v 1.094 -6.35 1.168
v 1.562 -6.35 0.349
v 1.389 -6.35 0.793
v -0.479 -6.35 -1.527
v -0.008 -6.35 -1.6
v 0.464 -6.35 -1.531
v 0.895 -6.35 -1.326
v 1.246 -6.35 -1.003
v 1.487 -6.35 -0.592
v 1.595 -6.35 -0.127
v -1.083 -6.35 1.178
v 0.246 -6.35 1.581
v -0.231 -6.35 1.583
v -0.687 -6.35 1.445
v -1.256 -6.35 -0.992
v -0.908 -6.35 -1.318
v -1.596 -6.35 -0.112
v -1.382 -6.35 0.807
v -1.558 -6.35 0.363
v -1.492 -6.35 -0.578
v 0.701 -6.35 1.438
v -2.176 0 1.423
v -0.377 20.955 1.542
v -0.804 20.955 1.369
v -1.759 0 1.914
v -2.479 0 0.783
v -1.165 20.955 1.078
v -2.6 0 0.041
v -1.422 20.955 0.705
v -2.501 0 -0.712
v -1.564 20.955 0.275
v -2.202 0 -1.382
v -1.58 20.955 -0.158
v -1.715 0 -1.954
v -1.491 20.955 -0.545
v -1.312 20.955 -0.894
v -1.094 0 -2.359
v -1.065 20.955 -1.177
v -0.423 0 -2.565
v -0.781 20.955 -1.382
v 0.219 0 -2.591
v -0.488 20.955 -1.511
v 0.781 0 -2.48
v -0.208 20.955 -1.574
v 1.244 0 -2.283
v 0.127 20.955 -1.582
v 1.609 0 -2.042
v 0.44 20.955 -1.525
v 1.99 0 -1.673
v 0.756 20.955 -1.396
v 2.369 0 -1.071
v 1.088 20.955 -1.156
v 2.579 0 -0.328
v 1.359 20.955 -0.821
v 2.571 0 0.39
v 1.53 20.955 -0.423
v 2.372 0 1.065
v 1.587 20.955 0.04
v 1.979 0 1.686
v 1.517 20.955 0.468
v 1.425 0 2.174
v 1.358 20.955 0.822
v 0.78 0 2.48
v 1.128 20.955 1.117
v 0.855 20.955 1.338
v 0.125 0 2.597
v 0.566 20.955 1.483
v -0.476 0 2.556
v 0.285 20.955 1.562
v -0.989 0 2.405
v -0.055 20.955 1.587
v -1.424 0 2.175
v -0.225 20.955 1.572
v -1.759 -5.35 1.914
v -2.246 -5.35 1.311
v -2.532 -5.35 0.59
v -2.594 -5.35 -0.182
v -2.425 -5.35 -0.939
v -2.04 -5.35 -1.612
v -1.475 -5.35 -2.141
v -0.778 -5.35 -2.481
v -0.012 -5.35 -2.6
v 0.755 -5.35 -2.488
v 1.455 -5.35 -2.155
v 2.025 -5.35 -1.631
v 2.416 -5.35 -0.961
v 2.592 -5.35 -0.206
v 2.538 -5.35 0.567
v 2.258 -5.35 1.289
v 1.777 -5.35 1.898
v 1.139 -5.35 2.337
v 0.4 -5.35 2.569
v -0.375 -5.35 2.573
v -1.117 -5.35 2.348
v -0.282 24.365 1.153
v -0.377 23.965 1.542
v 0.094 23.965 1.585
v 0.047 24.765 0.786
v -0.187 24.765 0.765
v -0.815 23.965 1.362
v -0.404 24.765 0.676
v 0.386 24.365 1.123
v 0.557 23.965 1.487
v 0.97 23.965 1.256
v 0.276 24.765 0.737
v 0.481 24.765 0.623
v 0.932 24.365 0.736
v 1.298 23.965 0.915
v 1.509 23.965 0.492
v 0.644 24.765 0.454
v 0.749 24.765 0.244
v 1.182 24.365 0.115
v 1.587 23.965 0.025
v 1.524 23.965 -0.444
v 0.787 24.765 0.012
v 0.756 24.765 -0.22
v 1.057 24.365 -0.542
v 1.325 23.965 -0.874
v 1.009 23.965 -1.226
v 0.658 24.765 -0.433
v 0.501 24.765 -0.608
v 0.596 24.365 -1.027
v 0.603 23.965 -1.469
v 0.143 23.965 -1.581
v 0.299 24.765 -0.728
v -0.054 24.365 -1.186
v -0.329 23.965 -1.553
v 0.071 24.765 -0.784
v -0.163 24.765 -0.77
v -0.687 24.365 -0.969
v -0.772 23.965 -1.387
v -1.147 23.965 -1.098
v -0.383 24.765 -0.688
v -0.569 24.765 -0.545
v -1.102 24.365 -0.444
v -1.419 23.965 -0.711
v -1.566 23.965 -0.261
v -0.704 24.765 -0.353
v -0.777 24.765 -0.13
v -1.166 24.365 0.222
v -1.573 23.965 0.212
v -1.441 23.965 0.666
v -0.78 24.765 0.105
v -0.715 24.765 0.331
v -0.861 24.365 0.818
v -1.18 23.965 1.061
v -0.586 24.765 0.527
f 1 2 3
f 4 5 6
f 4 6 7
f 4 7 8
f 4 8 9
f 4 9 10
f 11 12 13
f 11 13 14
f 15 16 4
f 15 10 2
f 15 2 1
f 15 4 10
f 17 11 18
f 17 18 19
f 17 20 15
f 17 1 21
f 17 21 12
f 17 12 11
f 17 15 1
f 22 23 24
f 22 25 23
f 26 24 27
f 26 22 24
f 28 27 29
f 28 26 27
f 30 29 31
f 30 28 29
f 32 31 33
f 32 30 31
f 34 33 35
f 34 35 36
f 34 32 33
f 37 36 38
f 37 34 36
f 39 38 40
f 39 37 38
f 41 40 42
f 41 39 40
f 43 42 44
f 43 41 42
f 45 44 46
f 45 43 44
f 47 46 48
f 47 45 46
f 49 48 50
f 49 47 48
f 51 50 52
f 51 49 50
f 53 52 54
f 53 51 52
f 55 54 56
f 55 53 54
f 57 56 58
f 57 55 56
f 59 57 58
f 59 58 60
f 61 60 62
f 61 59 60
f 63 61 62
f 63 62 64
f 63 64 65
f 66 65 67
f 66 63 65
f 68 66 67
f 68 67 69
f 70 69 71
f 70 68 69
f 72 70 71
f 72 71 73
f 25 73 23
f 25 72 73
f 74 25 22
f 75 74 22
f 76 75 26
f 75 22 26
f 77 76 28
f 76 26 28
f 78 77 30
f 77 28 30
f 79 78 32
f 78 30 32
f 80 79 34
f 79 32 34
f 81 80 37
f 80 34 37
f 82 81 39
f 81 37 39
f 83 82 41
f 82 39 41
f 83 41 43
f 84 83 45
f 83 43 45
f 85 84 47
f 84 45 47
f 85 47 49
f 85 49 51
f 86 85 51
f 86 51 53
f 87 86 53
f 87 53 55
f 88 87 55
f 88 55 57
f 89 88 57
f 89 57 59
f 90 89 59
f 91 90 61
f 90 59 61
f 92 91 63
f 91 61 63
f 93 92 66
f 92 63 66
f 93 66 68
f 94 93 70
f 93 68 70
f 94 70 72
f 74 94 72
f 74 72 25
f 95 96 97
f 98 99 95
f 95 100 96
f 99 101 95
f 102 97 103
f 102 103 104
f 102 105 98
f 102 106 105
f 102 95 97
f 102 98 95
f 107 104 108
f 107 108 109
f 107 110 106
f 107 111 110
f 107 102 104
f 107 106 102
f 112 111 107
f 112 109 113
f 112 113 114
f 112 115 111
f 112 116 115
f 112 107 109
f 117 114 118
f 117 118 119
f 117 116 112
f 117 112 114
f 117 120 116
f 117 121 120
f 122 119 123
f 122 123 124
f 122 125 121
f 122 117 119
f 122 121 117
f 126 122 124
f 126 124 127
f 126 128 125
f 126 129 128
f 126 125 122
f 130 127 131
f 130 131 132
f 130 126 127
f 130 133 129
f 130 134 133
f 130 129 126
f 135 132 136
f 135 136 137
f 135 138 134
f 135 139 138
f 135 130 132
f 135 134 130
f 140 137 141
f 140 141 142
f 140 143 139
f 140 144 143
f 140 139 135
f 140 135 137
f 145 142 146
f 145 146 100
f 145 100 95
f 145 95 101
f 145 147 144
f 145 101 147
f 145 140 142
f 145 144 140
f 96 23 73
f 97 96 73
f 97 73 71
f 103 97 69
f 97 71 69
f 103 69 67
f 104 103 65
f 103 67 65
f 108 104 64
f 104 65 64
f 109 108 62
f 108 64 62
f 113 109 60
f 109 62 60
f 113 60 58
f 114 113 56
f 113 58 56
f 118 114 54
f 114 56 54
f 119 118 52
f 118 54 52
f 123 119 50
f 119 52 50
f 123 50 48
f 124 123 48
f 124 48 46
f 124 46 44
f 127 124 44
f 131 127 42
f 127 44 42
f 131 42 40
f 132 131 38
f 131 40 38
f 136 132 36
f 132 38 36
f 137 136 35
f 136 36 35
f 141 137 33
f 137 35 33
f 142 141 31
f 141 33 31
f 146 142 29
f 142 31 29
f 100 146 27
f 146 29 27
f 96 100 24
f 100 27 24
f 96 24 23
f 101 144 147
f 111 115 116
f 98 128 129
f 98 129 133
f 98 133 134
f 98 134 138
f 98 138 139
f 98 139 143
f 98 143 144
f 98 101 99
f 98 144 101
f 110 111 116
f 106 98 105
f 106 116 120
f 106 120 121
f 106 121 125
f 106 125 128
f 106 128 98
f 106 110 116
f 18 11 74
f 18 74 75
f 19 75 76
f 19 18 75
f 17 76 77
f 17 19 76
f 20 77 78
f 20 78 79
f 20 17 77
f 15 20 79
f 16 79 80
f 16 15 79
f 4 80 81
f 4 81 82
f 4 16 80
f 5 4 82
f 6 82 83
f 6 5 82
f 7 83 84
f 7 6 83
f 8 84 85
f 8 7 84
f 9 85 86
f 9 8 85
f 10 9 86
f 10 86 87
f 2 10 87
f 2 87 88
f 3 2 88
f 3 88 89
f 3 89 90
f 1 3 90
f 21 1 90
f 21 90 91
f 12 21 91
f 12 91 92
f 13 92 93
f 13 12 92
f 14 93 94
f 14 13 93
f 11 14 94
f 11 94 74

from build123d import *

# Parameters (mm, degrees)
SKETCH3_R           = 2.6
BOSS_EXTRUDE1_DEPTH = 6.35
SKETCH4_R           = 1.5875
BOSS_EXTRUDE2_DEPTH = 3.81
CHAMFER5_SIZE       = 1
CHAMFER6_SIZE       = 0.8


with BuildPart() as part:
    # Loft1: read off the stored shape, not the designer's step
    # Loft1: loft between two sections, ruled curve by curve
    loft1_from = [
        Edge.make_bspline([(-0.37738018, 20.955, 1.541992364), (-3.461364907, 20.955, 0.787232004), (-2.706604547, 20.955, -2.296752724), (0.37738018, 20.955, -1.541992364), (3.461364907, 20.955, -0.787232004), (2.706604547, 20.955, 2.296752724), (-0.37738018, 20.955, 1.541992364)], [0, 0, 0, 0, 0.5, 0.5, 0.5, 1, 1, 1, 1], 3, [1, 0.333333333, 0.333333333, 1, 0.333333333, 0.333333333, 1]),
    ]
    loft1_to = [
        Edge.make_bspline([(-1.759476646, 0, 1.914220972), (-5.587918591, 0, -1.60473232), (-2.068965299, 0, -5.433174265), (1.759476646, 0, -1.914220972), (5.587918591, 0, 1.60473232), (2.068965299, 0, 5.433174265), (-1.759476646, 0, 1.914220972)], [0, 0, 0, 0, 0.5, 0.5, 0.5, 1, 1, 1, 1], 3, [1, 0.333333333, 0.333333333, 1, 0.333333333, 0.333333333, 1]),
    ]
    loft1 = Solid(Shell([*[Face.make_surface_from_curves(loft1_from[k], loft1_to[k]) for k in range(1)], Face(Wire(loft1_from)), Face(Wire(loft1_to))]))
    add(loft1)

    # Sketch3 → Boss-Extrude1 (add)
    with BuildSketch(Plane.XZ):
        with Locations(Location((0, 0, 0), (0, 0, 132.588))):
            Circle(SKETCH3_R)
    extrude(amount=BOSS_EXTRUDE1_DEPTH)

    # Sketch4 → Boss-Extrude2 (add)
    with BuildSketch(Plane(origin=(0, 20.955, 0), x_dir=(1, 0, 0), z_dir=(0, 1, 0))):
        with Locations(Location((0, 0, 0), (0, 0, 256.248))):
            Circle(SKETCH4_R)
    extrude(amount=BOSS_EXTRUDE2_DEPTH)

    # Chamfer5
    chamfer5_edges = [part.edges().sort_by_distance(p)[0] for p in [
        (1.759476646, -6.35, -1.914220972),
    ]]
    chamfer(chamfer5_edges, length=CHAMFER5_SIZE)

    # Chamfer6
    chamfer6_edges = [part.edges().sort_by_distance(p)[0] for p in [
        (0.37738018, 24.765, -1.541992364),
    ]]
    chamfer(chamfer6_edges, length=CHAMFER6_SIZE)


solid = part.part
